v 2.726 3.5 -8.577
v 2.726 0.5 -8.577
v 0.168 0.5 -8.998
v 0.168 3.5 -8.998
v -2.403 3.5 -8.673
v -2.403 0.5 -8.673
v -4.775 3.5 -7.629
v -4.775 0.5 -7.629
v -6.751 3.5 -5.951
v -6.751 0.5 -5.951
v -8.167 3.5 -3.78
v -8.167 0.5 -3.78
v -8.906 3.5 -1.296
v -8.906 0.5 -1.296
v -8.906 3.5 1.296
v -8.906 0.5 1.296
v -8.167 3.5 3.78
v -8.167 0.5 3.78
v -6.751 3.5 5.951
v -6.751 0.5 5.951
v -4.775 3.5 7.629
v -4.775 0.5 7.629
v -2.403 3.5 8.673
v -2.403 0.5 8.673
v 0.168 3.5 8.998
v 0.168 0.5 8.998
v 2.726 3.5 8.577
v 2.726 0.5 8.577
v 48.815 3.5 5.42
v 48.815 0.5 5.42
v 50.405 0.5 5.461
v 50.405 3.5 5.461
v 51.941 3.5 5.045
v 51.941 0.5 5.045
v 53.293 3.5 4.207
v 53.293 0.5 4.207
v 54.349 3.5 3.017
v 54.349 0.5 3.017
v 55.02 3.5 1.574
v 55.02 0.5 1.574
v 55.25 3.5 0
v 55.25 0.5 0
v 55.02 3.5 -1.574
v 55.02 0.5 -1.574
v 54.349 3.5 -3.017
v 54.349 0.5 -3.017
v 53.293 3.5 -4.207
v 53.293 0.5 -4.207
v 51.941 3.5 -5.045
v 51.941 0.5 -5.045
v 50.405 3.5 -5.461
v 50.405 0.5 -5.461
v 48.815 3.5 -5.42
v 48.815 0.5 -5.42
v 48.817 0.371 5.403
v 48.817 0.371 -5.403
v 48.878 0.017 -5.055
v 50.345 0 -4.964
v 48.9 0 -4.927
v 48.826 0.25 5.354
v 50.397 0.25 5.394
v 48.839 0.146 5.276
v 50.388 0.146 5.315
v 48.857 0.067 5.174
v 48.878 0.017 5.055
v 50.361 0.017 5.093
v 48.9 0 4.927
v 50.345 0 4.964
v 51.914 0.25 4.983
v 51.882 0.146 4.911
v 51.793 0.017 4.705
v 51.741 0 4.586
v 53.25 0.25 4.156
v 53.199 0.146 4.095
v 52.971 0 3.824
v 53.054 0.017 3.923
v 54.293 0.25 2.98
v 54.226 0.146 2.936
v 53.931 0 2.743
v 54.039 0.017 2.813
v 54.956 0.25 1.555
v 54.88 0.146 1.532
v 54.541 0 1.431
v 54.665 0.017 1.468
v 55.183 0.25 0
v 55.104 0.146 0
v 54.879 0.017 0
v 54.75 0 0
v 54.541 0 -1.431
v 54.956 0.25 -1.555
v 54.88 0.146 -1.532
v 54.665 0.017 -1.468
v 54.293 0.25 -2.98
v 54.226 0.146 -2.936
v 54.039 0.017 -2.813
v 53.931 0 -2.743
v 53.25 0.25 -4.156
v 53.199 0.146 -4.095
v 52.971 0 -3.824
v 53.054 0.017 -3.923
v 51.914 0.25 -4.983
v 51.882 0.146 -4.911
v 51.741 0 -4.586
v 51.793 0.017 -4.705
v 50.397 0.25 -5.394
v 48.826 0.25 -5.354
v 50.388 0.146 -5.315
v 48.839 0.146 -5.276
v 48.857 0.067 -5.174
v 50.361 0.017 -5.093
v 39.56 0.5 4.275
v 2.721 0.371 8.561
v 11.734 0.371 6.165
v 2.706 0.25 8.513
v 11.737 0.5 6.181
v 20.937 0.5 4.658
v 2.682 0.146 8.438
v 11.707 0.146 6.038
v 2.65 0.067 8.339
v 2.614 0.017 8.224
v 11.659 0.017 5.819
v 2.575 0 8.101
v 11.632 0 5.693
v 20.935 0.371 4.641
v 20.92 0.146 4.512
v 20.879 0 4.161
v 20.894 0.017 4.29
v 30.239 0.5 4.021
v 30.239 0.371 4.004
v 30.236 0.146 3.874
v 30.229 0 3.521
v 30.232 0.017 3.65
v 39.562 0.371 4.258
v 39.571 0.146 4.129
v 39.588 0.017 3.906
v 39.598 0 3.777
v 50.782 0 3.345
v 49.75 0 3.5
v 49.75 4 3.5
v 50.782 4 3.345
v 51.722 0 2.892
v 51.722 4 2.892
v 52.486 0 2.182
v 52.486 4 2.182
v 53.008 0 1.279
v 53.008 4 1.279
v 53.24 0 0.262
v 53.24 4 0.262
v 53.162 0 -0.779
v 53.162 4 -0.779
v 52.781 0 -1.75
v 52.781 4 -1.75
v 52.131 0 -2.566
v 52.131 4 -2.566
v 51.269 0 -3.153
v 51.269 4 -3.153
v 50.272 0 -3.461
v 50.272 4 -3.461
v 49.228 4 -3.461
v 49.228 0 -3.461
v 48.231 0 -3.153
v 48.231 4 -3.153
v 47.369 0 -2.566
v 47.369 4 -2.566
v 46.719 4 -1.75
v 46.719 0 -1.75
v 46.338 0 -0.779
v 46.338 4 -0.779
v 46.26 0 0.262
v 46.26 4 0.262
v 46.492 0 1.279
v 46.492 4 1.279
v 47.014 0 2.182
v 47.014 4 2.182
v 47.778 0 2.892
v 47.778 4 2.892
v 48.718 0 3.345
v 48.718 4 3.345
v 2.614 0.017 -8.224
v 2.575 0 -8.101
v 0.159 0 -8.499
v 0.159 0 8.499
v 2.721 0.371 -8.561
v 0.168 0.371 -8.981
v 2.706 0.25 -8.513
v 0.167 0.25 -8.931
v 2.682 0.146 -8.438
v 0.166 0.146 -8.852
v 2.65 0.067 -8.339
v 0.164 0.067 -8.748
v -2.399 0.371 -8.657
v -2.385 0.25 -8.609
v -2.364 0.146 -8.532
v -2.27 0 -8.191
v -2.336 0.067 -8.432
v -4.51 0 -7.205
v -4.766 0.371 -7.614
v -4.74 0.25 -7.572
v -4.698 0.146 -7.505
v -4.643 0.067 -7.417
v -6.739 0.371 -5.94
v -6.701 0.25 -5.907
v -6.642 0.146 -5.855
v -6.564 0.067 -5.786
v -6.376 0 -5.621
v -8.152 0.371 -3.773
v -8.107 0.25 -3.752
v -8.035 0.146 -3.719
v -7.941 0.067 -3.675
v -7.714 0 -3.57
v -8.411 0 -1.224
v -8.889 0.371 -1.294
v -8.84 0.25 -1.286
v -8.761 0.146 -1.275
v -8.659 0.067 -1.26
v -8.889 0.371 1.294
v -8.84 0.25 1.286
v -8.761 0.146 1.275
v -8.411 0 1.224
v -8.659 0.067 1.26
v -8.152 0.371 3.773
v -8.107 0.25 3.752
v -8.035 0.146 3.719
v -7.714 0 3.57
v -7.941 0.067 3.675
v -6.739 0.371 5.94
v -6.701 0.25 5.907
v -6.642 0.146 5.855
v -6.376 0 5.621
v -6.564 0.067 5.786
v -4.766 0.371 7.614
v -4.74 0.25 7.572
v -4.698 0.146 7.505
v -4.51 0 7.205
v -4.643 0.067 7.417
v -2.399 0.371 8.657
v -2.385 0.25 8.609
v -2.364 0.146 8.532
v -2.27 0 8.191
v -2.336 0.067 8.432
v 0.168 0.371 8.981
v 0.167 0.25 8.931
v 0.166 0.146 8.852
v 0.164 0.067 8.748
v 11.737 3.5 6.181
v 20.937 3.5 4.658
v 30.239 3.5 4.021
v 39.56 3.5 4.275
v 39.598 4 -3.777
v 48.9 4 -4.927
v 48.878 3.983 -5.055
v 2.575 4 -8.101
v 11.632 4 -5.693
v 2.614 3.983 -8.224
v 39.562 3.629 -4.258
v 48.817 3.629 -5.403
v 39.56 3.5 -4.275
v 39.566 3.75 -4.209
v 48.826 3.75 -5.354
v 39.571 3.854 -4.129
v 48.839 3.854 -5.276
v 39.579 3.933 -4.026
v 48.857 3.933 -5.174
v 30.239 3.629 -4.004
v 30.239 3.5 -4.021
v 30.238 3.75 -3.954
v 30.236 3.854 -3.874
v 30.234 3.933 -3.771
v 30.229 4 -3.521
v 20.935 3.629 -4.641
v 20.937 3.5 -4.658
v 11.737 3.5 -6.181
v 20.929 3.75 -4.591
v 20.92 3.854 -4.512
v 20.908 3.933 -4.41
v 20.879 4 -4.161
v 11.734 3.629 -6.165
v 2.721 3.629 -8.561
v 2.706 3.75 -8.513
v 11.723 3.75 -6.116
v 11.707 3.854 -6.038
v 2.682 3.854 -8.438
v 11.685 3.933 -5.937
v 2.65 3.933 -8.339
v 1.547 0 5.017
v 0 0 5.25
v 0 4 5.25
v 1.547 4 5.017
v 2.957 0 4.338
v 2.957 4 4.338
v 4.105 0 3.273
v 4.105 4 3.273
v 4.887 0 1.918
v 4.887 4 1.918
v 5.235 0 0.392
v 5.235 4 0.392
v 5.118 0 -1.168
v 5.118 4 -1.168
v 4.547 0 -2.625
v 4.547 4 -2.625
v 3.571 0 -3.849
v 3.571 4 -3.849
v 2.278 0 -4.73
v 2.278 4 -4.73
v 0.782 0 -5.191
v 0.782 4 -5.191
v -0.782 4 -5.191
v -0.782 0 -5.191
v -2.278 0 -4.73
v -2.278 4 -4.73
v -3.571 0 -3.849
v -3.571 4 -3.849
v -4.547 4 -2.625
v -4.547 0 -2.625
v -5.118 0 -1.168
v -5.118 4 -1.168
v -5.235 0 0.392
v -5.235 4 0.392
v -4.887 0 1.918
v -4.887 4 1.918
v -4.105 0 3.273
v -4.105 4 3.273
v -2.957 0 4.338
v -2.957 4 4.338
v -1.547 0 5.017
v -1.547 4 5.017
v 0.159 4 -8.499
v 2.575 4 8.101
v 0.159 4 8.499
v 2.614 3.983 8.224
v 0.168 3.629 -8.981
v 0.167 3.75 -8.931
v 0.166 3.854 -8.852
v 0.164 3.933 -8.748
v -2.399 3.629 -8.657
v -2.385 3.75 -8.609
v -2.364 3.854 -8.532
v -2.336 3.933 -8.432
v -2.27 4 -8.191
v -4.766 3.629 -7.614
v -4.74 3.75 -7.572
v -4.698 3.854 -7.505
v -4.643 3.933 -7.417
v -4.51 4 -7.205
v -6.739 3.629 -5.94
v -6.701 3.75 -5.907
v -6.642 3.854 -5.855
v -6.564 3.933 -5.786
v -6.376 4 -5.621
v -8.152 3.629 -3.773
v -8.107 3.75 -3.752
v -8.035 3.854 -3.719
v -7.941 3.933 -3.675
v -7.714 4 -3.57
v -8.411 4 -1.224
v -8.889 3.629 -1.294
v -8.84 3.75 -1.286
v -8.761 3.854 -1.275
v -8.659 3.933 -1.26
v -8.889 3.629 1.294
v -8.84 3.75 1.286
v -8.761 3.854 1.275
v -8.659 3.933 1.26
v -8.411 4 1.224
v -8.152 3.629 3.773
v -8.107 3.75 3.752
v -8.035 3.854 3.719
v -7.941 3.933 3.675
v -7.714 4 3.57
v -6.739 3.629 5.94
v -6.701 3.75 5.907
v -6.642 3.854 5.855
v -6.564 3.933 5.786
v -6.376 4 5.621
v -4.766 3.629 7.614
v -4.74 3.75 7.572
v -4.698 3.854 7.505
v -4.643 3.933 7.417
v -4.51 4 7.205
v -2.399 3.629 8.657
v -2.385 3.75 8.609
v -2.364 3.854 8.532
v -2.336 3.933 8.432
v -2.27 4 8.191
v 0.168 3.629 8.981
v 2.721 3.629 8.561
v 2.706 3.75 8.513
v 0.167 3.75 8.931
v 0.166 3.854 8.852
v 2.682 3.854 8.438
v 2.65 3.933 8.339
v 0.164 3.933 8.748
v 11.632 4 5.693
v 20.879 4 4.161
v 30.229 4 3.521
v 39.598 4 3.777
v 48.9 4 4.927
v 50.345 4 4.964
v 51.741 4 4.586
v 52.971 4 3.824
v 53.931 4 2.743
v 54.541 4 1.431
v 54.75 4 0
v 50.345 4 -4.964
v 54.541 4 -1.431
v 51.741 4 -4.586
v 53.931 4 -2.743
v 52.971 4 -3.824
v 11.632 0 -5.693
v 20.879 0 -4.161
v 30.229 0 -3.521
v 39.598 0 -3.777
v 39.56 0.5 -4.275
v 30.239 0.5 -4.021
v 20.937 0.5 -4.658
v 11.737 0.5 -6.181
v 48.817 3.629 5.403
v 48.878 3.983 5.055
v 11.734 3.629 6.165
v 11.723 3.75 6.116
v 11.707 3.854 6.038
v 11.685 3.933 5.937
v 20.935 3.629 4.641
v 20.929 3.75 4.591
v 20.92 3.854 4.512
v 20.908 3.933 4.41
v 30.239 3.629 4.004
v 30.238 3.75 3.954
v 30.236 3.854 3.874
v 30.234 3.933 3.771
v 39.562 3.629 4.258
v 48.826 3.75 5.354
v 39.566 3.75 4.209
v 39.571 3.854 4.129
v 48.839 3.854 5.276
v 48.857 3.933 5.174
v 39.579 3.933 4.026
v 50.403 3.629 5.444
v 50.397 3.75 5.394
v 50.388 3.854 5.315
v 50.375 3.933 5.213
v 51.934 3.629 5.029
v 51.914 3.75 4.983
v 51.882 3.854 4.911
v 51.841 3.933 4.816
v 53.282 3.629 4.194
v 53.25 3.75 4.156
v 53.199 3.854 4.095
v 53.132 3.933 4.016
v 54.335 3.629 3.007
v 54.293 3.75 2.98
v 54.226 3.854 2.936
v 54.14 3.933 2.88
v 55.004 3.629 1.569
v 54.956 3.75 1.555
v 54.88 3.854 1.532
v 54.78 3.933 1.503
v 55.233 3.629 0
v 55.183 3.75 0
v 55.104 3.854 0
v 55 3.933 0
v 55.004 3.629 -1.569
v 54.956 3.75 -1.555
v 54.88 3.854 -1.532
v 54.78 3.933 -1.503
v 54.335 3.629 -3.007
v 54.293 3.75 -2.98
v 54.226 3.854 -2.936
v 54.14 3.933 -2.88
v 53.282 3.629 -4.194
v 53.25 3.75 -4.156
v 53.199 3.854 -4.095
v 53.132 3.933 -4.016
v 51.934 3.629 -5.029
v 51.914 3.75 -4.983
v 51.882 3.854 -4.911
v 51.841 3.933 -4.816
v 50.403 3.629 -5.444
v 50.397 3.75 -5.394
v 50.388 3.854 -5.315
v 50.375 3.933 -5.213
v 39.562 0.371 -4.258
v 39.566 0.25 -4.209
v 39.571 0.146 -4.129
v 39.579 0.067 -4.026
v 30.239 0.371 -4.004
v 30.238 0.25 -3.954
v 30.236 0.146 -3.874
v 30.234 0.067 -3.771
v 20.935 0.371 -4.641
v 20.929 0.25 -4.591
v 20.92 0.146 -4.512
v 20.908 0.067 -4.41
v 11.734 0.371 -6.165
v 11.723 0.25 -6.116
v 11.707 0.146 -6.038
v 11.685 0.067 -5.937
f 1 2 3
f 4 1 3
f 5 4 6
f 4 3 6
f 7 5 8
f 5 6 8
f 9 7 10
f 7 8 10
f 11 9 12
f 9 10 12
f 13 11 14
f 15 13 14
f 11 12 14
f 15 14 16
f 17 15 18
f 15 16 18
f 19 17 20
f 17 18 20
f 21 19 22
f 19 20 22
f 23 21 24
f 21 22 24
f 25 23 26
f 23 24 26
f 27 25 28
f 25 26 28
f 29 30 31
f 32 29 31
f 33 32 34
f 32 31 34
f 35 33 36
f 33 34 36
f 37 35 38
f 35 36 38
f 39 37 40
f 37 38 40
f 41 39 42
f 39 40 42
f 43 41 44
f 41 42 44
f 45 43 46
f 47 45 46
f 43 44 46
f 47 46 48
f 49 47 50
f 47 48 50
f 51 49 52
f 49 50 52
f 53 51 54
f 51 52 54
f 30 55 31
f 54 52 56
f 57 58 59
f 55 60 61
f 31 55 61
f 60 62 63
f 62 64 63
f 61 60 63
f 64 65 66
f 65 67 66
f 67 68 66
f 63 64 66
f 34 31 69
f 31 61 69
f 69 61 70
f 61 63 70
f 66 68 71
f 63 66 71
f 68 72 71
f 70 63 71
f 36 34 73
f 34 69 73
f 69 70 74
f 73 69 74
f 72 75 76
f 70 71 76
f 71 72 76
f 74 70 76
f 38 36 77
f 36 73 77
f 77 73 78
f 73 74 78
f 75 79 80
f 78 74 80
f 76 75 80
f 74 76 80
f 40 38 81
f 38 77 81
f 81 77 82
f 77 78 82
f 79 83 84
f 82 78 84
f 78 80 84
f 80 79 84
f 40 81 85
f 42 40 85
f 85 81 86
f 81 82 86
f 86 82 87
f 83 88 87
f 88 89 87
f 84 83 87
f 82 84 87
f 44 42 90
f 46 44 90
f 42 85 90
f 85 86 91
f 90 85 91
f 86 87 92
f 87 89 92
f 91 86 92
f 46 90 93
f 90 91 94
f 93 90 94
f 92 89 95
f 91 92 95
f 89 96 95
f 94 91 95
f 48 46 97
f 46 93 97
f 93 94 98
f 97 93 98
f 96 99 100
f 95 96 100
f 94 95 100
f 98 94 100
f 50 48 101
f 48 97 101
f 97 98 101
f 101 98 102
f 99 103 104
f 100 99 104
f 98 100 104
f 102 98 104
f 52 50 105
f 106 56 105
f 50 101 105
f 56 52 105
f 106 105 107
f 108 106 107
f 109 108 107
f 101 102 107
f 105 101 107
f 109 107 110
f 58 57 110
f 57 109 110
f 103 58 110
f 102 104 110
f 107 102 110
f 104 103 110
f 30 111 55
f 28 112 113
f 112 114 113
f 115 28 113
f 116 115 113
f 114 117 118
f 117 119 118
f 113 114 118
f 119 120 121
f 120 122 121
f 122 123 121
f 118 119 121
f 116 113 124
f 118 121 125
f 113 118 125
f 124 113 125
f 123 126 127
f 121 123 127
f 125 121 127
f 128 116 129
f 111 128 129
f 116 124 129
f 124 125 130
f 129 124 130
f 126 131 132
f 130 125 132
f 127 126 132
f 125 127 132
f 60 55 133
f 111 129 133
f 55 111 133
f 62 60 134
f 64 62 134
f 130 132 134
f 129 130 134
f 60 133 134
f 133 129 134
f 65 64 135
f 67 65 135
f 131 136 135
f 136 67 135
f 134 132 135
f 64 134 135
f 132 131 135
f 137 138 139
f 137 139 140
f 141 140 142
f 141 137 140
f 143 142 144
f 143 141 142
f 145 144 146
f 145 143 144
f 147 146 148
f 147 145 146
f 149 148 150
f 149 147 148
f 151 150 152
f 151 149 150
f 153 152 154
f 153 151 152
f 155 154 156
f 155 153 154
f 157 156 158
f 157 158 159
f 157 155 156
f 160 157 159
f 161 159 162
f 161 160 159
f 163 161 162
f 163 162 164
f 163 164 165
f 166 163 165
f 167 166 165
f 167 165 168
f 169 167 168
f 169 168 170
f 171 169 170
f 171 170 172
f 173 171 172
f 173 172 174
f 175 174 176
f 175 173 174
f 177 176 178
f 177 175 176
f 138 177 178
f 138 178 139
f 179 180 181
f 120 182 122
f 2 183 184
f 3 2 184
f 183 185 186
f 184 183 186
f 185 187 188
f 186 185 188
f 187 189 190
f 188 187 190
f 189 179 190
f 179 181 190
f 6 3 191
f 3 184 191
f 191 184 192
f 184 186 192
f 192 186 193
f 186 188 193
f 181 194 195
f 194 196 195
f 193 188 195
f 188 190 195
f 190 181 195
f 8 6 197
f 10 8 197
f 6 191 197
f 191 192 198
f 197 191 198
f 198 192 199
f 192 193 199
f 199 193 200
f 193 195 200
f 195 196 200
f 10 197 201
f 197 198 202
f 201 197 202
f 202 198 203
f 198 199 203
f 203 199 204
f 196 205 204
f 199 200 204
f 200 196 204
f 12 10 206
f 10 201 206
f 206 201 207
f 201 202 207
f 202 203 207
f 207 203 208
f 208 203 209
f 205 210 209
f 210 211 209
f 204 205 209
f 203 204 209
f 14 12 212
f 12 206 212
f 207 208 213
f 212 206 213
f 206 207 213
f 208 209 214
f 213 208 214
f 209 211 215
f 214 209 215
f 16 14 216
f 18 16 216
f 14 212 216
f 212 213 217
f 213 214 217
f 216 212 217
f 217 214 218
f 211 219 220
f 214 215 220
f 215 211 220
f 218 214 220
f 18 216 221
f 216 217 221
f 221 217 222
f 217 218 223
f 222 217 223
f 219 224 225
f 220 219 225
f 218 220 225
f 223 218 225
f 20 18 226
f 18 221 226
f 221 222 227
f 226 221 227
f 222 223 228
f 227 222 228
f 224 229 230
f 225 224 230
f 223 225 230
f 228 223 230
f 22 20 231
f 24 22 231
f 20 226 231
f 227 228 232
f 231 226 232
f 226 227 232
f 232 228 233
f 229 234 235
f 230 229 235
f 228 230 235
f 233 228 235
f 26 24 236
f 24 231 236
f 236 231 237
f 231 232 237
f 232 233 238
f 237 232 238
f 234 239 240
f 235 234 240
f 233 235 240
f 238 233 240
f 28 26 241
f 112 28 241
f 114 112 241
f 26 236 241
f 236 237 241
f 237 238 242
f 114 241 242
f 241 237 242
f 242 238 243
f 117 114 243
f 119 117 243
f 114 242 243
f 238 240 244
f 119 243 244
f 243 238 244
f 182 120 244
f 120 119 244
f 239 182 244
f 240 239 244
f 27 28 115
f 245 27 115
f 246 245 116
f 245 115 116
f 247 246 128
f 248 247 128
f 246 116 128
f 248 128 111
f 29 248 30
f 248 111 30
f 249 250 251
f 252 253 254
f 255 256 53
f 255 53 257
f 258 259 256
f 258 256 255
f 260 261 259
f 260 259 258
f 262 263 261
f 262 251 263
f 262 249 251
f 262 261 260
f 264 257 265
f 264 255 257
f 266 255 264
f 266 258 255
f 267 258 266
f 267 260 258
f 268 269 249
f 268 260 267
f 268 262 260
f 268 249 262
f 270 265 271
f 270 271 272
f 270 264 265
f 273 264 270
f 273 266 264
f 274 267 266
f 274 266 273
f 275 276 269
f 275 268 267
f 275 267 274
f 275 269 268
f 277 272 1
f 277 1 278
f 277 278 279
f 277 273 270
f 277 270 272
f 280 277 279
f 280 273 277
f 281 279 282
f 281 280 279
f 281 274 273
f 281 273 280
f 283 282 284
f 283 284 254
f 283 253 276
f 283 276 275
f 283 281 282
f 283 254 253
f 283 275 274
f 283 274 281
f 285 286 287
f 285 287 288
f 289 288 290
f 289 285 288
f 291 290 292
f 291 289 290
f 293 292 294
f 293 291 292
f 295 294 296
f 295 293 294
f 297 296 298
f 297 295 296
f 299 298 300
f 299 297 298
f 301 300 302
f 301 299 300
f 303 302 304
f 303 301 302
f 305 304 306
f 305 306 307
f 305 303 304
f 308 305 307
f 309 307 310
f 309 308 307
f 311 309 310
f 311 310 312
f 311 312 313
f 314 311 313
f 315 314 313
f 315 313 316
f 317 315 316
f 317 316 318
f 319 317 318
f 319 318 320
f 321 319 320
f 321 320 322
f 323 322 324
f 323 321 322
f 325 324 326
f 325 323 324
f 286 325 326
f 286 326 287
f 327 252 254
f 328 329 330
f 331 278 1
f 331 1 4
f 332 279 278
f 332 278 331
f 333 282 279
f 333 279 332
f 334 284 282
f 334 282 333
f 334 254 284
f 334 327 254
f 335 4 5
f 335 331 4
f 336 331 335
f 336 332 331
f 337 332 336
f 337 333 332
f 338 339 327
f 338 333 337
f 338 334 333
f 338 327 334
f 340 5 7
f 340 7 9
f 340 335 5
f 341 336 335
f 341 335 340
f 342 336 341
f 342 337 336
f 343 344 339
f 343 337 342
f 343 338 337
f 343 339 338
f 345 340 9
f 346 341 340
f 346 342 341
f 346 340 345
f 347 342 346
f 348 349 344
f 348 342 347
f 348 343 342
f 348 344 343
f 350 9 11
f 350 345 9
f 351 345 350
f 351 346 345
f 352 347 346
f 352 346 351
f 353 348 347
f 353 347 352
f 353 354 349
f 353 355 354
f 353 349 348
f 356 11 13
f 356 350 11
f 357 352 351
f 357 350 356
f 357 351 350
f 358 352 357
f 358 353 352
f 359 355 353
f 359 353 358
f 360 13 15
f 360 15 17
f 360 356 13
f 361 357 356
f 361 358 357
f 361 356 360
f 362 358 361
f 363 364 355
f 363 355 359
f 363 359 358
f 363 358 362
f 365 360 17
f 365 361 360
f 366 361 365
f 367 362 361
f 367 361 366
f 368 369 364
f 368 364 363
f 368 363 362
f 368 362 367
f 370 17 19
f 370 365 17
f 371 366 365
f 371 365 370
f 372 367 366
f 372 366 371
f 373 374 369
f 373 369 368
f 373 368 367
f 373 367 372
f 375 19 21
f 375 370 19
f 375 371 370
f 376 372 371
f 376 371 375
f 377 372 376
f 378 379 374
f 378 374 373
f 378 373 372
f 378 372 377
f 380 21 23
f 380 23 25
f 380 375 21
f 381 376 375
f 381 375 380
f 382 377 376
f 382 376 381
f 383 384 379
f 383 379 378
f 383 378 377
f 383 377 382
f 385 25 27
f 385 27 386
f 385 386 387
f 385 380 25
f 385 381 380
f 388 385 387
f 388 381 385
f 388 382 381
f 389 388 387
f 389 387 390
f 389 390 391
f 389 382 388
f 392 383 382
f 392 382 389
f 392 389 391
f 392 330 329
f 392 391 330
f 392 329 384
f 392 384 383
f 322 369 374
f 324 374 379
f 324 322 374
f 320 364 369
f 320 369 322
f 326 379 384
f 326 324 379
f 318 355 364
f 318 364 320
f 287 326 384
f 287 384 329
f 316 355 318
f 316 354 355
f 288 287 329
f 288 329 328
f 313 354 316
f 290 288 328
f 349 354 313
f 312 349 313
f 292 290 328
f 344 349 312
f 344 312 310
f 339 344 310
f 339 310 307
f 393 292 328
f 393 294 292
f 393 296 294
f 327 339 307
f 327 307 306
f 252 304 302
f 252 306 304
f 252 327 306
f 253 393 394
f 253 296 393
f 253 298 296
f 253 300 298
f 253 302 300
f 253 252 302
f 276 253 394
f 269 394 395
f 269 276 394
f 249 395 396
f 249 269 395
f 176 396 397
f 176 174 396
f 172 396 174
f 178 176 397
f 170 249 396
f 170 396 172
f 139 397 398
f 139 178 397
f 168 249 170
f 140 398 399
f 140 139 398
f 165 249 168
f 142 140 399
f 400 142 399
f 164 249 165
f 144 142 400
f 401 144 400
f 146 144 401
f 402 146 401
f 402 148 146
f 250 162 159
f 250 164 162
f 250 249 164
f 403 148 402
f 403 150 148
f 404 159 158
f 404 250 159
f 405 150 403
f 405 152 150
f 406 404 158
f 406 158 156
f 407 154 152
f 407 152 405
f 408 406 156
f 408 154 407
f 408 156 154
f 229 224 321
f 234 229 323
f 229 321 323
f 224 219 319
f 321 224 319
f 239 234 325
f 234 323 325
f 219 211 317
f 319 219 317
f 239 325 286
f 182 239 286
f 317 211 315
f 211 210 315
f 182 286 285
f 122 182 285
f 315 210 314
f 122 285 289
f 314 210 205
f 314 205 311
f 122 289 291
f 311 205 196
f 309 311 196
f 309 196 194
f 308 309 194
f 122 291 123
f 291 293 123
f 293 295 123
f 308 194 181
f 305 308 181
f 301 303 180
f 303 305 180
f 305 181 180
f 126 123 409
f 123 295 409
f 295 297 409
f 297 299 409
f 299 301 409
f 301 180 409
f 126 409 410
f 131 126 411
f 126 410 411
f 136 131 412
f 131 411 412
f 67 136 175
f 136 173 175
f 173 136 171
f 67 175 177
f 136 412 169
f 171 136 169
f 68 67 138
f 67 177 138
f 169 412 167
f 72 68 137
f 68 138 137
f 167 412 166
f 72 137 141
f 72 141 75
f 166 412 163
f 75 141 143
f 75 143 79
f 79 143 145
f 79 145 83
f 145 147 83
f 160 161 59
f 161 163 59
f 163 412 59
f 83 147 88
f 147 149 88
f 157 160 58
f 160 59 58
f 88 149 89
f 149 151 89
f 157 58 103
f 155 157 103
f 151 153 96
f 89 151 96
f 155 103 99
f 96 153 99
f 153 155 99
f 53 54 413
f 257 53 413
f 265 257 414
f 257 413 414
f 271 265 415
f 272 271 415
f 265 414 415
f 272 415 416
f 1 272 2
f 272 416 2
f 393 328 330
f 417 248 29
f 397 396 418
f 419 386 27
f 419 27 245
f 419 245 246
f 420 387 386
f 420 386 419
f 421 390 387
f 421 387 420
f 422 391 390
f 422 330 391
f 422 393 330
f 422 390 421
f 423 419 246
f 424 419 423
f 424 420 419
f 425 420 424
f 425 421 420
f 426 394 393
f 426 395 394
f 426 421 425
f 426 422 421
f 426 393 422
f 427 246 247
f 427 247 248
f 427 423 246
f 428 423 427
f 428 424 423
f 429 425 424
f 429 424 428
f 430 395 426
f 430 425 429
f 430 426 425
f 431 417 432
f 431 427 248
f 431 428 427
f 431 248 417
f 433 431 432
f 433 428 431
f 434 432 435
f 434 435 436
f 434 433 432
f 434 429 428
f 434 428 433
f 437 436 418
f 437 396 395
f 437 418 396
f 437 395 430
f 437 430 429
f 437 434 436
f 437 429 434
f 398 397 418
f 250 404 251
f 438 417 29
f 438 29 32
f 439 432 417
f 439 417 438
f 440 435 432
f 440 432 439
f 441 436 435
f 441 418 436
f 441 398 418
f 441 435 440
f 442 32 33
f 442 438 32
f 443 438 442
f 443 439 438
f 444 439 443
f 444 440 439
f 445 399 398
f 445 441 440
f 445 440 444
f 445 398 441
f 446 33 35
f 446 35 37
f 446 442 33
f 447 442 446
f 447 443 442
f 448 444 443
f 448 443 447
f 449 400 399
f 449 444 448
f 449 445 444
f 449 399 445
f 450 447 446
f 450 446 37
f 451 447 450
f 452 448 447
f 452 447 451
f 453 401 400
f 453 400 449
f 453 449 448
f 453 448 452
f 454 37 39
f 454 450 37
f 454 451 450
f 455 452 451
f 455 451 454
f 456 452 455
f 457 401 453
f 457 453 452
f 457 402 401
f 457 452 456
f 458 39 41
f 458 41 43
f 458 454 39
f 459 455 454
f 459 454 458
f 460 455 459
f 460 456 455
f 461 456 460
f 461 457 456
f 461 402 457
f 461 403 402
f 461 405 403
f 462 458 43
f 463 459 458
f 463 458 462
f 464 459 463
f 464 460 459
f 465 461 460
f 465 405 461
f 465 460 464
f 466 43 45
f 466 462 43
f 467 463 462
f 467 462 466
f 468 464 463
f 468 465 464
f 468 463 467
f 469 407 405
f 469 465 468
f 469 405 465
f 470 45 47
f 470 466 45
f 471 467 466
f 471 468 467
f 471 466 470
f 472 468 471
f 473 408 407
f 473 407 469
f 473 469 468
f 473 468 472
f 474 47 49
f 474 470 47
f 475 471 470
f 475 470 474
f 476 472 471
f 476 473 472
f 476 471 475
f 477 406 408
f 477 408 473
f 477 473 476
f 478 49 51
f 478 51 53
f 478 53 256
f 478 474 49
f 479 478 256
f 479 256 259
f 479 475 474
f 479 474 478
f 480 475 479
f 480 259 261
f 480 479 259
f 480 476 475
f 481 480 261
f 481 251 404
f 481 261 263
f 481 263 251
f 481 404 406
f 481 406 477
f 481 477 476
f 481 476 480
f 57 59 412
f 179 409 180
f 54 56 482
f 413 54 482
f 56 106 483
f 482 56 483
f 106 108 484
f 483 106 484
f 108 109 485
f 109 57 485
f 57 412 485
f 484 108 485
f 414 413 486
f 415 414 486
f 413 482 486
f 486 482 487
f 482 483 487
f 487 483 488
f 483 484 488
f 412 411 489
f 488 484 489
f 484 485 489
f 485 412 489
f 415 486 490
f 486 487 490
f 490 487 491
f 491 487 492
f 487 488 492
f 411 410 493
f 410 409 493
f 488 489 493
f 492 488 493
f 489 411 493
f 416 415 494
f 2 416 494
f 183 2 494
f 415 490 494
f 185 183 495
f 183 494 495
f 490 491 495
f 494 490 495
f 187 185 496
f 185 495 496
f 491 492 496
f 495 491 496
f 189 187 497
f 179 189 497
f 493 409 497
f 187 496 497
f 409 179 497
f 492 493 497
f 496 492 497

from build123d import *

# Parameters (mm, degrees)
SKETCH_1_R      = 5.25
SKETCH_1_R_2    = 3.5
EXTRUDE_1_DEPTH = 4
FILLET_1_R      = 0.5


with BuildPart() as part:
    # 草图1 → 凸台-拉伸1 (new body)
    with BuildSketch(Plane(origin=(0, 0, 0), x_dir=(1, 0, 0), z_dir=(0, 1, 0))):
        with BuildLine():
            ThreePointArc((2.725960977, 8.577245289), (-9, 0), (2.725960977, -8.577245289))
            ThreePointArc((2.725960977, -8.577245289), (25.580430084, -4.227861915), (48.814522163, -5.419859889))
            ThreePointArc((48.814522163, -5.419859889), (55.25, 0), (48.814522163, 5.419859889))
            ThreePointArc((48.814522163, 5.419859889), (25.580430084, 4.227861915), (2.725960977, 8.577245289))
        make_face()
        with Locations(Location((0, 0, 0), (0, 0, 270))):
            Circle(SKETCH_1_R, mode=Mode.SUBTRACT)
        with Locations(Location((49.75, 0, 0), (0, 0, 270))):
            Circle(SKETCH_1_R_2, mode=Mode.SUBTRACT)
    extrude(amount=EXTRUDE_1_DEPTH)

    # 圆角1
    fillet_1_edges = [part.edges().sort_by_distance(p)[0] for p in [
        (25.580430084, 4, 4.227861915),
        (55.25, 4, 0),
        (25.580430084, 4, -4.227861915),
        (55.25, 0, 0),
        (25.580430084, 0, 4.227861915),
        (-9, 0, 0),
        (25.580430084, 0, -4.227861915),
        (-9, 4, 0),
    ]]
    fillet(fillet_1_edges, radius=FILLET_1_R)


solid = part.part
